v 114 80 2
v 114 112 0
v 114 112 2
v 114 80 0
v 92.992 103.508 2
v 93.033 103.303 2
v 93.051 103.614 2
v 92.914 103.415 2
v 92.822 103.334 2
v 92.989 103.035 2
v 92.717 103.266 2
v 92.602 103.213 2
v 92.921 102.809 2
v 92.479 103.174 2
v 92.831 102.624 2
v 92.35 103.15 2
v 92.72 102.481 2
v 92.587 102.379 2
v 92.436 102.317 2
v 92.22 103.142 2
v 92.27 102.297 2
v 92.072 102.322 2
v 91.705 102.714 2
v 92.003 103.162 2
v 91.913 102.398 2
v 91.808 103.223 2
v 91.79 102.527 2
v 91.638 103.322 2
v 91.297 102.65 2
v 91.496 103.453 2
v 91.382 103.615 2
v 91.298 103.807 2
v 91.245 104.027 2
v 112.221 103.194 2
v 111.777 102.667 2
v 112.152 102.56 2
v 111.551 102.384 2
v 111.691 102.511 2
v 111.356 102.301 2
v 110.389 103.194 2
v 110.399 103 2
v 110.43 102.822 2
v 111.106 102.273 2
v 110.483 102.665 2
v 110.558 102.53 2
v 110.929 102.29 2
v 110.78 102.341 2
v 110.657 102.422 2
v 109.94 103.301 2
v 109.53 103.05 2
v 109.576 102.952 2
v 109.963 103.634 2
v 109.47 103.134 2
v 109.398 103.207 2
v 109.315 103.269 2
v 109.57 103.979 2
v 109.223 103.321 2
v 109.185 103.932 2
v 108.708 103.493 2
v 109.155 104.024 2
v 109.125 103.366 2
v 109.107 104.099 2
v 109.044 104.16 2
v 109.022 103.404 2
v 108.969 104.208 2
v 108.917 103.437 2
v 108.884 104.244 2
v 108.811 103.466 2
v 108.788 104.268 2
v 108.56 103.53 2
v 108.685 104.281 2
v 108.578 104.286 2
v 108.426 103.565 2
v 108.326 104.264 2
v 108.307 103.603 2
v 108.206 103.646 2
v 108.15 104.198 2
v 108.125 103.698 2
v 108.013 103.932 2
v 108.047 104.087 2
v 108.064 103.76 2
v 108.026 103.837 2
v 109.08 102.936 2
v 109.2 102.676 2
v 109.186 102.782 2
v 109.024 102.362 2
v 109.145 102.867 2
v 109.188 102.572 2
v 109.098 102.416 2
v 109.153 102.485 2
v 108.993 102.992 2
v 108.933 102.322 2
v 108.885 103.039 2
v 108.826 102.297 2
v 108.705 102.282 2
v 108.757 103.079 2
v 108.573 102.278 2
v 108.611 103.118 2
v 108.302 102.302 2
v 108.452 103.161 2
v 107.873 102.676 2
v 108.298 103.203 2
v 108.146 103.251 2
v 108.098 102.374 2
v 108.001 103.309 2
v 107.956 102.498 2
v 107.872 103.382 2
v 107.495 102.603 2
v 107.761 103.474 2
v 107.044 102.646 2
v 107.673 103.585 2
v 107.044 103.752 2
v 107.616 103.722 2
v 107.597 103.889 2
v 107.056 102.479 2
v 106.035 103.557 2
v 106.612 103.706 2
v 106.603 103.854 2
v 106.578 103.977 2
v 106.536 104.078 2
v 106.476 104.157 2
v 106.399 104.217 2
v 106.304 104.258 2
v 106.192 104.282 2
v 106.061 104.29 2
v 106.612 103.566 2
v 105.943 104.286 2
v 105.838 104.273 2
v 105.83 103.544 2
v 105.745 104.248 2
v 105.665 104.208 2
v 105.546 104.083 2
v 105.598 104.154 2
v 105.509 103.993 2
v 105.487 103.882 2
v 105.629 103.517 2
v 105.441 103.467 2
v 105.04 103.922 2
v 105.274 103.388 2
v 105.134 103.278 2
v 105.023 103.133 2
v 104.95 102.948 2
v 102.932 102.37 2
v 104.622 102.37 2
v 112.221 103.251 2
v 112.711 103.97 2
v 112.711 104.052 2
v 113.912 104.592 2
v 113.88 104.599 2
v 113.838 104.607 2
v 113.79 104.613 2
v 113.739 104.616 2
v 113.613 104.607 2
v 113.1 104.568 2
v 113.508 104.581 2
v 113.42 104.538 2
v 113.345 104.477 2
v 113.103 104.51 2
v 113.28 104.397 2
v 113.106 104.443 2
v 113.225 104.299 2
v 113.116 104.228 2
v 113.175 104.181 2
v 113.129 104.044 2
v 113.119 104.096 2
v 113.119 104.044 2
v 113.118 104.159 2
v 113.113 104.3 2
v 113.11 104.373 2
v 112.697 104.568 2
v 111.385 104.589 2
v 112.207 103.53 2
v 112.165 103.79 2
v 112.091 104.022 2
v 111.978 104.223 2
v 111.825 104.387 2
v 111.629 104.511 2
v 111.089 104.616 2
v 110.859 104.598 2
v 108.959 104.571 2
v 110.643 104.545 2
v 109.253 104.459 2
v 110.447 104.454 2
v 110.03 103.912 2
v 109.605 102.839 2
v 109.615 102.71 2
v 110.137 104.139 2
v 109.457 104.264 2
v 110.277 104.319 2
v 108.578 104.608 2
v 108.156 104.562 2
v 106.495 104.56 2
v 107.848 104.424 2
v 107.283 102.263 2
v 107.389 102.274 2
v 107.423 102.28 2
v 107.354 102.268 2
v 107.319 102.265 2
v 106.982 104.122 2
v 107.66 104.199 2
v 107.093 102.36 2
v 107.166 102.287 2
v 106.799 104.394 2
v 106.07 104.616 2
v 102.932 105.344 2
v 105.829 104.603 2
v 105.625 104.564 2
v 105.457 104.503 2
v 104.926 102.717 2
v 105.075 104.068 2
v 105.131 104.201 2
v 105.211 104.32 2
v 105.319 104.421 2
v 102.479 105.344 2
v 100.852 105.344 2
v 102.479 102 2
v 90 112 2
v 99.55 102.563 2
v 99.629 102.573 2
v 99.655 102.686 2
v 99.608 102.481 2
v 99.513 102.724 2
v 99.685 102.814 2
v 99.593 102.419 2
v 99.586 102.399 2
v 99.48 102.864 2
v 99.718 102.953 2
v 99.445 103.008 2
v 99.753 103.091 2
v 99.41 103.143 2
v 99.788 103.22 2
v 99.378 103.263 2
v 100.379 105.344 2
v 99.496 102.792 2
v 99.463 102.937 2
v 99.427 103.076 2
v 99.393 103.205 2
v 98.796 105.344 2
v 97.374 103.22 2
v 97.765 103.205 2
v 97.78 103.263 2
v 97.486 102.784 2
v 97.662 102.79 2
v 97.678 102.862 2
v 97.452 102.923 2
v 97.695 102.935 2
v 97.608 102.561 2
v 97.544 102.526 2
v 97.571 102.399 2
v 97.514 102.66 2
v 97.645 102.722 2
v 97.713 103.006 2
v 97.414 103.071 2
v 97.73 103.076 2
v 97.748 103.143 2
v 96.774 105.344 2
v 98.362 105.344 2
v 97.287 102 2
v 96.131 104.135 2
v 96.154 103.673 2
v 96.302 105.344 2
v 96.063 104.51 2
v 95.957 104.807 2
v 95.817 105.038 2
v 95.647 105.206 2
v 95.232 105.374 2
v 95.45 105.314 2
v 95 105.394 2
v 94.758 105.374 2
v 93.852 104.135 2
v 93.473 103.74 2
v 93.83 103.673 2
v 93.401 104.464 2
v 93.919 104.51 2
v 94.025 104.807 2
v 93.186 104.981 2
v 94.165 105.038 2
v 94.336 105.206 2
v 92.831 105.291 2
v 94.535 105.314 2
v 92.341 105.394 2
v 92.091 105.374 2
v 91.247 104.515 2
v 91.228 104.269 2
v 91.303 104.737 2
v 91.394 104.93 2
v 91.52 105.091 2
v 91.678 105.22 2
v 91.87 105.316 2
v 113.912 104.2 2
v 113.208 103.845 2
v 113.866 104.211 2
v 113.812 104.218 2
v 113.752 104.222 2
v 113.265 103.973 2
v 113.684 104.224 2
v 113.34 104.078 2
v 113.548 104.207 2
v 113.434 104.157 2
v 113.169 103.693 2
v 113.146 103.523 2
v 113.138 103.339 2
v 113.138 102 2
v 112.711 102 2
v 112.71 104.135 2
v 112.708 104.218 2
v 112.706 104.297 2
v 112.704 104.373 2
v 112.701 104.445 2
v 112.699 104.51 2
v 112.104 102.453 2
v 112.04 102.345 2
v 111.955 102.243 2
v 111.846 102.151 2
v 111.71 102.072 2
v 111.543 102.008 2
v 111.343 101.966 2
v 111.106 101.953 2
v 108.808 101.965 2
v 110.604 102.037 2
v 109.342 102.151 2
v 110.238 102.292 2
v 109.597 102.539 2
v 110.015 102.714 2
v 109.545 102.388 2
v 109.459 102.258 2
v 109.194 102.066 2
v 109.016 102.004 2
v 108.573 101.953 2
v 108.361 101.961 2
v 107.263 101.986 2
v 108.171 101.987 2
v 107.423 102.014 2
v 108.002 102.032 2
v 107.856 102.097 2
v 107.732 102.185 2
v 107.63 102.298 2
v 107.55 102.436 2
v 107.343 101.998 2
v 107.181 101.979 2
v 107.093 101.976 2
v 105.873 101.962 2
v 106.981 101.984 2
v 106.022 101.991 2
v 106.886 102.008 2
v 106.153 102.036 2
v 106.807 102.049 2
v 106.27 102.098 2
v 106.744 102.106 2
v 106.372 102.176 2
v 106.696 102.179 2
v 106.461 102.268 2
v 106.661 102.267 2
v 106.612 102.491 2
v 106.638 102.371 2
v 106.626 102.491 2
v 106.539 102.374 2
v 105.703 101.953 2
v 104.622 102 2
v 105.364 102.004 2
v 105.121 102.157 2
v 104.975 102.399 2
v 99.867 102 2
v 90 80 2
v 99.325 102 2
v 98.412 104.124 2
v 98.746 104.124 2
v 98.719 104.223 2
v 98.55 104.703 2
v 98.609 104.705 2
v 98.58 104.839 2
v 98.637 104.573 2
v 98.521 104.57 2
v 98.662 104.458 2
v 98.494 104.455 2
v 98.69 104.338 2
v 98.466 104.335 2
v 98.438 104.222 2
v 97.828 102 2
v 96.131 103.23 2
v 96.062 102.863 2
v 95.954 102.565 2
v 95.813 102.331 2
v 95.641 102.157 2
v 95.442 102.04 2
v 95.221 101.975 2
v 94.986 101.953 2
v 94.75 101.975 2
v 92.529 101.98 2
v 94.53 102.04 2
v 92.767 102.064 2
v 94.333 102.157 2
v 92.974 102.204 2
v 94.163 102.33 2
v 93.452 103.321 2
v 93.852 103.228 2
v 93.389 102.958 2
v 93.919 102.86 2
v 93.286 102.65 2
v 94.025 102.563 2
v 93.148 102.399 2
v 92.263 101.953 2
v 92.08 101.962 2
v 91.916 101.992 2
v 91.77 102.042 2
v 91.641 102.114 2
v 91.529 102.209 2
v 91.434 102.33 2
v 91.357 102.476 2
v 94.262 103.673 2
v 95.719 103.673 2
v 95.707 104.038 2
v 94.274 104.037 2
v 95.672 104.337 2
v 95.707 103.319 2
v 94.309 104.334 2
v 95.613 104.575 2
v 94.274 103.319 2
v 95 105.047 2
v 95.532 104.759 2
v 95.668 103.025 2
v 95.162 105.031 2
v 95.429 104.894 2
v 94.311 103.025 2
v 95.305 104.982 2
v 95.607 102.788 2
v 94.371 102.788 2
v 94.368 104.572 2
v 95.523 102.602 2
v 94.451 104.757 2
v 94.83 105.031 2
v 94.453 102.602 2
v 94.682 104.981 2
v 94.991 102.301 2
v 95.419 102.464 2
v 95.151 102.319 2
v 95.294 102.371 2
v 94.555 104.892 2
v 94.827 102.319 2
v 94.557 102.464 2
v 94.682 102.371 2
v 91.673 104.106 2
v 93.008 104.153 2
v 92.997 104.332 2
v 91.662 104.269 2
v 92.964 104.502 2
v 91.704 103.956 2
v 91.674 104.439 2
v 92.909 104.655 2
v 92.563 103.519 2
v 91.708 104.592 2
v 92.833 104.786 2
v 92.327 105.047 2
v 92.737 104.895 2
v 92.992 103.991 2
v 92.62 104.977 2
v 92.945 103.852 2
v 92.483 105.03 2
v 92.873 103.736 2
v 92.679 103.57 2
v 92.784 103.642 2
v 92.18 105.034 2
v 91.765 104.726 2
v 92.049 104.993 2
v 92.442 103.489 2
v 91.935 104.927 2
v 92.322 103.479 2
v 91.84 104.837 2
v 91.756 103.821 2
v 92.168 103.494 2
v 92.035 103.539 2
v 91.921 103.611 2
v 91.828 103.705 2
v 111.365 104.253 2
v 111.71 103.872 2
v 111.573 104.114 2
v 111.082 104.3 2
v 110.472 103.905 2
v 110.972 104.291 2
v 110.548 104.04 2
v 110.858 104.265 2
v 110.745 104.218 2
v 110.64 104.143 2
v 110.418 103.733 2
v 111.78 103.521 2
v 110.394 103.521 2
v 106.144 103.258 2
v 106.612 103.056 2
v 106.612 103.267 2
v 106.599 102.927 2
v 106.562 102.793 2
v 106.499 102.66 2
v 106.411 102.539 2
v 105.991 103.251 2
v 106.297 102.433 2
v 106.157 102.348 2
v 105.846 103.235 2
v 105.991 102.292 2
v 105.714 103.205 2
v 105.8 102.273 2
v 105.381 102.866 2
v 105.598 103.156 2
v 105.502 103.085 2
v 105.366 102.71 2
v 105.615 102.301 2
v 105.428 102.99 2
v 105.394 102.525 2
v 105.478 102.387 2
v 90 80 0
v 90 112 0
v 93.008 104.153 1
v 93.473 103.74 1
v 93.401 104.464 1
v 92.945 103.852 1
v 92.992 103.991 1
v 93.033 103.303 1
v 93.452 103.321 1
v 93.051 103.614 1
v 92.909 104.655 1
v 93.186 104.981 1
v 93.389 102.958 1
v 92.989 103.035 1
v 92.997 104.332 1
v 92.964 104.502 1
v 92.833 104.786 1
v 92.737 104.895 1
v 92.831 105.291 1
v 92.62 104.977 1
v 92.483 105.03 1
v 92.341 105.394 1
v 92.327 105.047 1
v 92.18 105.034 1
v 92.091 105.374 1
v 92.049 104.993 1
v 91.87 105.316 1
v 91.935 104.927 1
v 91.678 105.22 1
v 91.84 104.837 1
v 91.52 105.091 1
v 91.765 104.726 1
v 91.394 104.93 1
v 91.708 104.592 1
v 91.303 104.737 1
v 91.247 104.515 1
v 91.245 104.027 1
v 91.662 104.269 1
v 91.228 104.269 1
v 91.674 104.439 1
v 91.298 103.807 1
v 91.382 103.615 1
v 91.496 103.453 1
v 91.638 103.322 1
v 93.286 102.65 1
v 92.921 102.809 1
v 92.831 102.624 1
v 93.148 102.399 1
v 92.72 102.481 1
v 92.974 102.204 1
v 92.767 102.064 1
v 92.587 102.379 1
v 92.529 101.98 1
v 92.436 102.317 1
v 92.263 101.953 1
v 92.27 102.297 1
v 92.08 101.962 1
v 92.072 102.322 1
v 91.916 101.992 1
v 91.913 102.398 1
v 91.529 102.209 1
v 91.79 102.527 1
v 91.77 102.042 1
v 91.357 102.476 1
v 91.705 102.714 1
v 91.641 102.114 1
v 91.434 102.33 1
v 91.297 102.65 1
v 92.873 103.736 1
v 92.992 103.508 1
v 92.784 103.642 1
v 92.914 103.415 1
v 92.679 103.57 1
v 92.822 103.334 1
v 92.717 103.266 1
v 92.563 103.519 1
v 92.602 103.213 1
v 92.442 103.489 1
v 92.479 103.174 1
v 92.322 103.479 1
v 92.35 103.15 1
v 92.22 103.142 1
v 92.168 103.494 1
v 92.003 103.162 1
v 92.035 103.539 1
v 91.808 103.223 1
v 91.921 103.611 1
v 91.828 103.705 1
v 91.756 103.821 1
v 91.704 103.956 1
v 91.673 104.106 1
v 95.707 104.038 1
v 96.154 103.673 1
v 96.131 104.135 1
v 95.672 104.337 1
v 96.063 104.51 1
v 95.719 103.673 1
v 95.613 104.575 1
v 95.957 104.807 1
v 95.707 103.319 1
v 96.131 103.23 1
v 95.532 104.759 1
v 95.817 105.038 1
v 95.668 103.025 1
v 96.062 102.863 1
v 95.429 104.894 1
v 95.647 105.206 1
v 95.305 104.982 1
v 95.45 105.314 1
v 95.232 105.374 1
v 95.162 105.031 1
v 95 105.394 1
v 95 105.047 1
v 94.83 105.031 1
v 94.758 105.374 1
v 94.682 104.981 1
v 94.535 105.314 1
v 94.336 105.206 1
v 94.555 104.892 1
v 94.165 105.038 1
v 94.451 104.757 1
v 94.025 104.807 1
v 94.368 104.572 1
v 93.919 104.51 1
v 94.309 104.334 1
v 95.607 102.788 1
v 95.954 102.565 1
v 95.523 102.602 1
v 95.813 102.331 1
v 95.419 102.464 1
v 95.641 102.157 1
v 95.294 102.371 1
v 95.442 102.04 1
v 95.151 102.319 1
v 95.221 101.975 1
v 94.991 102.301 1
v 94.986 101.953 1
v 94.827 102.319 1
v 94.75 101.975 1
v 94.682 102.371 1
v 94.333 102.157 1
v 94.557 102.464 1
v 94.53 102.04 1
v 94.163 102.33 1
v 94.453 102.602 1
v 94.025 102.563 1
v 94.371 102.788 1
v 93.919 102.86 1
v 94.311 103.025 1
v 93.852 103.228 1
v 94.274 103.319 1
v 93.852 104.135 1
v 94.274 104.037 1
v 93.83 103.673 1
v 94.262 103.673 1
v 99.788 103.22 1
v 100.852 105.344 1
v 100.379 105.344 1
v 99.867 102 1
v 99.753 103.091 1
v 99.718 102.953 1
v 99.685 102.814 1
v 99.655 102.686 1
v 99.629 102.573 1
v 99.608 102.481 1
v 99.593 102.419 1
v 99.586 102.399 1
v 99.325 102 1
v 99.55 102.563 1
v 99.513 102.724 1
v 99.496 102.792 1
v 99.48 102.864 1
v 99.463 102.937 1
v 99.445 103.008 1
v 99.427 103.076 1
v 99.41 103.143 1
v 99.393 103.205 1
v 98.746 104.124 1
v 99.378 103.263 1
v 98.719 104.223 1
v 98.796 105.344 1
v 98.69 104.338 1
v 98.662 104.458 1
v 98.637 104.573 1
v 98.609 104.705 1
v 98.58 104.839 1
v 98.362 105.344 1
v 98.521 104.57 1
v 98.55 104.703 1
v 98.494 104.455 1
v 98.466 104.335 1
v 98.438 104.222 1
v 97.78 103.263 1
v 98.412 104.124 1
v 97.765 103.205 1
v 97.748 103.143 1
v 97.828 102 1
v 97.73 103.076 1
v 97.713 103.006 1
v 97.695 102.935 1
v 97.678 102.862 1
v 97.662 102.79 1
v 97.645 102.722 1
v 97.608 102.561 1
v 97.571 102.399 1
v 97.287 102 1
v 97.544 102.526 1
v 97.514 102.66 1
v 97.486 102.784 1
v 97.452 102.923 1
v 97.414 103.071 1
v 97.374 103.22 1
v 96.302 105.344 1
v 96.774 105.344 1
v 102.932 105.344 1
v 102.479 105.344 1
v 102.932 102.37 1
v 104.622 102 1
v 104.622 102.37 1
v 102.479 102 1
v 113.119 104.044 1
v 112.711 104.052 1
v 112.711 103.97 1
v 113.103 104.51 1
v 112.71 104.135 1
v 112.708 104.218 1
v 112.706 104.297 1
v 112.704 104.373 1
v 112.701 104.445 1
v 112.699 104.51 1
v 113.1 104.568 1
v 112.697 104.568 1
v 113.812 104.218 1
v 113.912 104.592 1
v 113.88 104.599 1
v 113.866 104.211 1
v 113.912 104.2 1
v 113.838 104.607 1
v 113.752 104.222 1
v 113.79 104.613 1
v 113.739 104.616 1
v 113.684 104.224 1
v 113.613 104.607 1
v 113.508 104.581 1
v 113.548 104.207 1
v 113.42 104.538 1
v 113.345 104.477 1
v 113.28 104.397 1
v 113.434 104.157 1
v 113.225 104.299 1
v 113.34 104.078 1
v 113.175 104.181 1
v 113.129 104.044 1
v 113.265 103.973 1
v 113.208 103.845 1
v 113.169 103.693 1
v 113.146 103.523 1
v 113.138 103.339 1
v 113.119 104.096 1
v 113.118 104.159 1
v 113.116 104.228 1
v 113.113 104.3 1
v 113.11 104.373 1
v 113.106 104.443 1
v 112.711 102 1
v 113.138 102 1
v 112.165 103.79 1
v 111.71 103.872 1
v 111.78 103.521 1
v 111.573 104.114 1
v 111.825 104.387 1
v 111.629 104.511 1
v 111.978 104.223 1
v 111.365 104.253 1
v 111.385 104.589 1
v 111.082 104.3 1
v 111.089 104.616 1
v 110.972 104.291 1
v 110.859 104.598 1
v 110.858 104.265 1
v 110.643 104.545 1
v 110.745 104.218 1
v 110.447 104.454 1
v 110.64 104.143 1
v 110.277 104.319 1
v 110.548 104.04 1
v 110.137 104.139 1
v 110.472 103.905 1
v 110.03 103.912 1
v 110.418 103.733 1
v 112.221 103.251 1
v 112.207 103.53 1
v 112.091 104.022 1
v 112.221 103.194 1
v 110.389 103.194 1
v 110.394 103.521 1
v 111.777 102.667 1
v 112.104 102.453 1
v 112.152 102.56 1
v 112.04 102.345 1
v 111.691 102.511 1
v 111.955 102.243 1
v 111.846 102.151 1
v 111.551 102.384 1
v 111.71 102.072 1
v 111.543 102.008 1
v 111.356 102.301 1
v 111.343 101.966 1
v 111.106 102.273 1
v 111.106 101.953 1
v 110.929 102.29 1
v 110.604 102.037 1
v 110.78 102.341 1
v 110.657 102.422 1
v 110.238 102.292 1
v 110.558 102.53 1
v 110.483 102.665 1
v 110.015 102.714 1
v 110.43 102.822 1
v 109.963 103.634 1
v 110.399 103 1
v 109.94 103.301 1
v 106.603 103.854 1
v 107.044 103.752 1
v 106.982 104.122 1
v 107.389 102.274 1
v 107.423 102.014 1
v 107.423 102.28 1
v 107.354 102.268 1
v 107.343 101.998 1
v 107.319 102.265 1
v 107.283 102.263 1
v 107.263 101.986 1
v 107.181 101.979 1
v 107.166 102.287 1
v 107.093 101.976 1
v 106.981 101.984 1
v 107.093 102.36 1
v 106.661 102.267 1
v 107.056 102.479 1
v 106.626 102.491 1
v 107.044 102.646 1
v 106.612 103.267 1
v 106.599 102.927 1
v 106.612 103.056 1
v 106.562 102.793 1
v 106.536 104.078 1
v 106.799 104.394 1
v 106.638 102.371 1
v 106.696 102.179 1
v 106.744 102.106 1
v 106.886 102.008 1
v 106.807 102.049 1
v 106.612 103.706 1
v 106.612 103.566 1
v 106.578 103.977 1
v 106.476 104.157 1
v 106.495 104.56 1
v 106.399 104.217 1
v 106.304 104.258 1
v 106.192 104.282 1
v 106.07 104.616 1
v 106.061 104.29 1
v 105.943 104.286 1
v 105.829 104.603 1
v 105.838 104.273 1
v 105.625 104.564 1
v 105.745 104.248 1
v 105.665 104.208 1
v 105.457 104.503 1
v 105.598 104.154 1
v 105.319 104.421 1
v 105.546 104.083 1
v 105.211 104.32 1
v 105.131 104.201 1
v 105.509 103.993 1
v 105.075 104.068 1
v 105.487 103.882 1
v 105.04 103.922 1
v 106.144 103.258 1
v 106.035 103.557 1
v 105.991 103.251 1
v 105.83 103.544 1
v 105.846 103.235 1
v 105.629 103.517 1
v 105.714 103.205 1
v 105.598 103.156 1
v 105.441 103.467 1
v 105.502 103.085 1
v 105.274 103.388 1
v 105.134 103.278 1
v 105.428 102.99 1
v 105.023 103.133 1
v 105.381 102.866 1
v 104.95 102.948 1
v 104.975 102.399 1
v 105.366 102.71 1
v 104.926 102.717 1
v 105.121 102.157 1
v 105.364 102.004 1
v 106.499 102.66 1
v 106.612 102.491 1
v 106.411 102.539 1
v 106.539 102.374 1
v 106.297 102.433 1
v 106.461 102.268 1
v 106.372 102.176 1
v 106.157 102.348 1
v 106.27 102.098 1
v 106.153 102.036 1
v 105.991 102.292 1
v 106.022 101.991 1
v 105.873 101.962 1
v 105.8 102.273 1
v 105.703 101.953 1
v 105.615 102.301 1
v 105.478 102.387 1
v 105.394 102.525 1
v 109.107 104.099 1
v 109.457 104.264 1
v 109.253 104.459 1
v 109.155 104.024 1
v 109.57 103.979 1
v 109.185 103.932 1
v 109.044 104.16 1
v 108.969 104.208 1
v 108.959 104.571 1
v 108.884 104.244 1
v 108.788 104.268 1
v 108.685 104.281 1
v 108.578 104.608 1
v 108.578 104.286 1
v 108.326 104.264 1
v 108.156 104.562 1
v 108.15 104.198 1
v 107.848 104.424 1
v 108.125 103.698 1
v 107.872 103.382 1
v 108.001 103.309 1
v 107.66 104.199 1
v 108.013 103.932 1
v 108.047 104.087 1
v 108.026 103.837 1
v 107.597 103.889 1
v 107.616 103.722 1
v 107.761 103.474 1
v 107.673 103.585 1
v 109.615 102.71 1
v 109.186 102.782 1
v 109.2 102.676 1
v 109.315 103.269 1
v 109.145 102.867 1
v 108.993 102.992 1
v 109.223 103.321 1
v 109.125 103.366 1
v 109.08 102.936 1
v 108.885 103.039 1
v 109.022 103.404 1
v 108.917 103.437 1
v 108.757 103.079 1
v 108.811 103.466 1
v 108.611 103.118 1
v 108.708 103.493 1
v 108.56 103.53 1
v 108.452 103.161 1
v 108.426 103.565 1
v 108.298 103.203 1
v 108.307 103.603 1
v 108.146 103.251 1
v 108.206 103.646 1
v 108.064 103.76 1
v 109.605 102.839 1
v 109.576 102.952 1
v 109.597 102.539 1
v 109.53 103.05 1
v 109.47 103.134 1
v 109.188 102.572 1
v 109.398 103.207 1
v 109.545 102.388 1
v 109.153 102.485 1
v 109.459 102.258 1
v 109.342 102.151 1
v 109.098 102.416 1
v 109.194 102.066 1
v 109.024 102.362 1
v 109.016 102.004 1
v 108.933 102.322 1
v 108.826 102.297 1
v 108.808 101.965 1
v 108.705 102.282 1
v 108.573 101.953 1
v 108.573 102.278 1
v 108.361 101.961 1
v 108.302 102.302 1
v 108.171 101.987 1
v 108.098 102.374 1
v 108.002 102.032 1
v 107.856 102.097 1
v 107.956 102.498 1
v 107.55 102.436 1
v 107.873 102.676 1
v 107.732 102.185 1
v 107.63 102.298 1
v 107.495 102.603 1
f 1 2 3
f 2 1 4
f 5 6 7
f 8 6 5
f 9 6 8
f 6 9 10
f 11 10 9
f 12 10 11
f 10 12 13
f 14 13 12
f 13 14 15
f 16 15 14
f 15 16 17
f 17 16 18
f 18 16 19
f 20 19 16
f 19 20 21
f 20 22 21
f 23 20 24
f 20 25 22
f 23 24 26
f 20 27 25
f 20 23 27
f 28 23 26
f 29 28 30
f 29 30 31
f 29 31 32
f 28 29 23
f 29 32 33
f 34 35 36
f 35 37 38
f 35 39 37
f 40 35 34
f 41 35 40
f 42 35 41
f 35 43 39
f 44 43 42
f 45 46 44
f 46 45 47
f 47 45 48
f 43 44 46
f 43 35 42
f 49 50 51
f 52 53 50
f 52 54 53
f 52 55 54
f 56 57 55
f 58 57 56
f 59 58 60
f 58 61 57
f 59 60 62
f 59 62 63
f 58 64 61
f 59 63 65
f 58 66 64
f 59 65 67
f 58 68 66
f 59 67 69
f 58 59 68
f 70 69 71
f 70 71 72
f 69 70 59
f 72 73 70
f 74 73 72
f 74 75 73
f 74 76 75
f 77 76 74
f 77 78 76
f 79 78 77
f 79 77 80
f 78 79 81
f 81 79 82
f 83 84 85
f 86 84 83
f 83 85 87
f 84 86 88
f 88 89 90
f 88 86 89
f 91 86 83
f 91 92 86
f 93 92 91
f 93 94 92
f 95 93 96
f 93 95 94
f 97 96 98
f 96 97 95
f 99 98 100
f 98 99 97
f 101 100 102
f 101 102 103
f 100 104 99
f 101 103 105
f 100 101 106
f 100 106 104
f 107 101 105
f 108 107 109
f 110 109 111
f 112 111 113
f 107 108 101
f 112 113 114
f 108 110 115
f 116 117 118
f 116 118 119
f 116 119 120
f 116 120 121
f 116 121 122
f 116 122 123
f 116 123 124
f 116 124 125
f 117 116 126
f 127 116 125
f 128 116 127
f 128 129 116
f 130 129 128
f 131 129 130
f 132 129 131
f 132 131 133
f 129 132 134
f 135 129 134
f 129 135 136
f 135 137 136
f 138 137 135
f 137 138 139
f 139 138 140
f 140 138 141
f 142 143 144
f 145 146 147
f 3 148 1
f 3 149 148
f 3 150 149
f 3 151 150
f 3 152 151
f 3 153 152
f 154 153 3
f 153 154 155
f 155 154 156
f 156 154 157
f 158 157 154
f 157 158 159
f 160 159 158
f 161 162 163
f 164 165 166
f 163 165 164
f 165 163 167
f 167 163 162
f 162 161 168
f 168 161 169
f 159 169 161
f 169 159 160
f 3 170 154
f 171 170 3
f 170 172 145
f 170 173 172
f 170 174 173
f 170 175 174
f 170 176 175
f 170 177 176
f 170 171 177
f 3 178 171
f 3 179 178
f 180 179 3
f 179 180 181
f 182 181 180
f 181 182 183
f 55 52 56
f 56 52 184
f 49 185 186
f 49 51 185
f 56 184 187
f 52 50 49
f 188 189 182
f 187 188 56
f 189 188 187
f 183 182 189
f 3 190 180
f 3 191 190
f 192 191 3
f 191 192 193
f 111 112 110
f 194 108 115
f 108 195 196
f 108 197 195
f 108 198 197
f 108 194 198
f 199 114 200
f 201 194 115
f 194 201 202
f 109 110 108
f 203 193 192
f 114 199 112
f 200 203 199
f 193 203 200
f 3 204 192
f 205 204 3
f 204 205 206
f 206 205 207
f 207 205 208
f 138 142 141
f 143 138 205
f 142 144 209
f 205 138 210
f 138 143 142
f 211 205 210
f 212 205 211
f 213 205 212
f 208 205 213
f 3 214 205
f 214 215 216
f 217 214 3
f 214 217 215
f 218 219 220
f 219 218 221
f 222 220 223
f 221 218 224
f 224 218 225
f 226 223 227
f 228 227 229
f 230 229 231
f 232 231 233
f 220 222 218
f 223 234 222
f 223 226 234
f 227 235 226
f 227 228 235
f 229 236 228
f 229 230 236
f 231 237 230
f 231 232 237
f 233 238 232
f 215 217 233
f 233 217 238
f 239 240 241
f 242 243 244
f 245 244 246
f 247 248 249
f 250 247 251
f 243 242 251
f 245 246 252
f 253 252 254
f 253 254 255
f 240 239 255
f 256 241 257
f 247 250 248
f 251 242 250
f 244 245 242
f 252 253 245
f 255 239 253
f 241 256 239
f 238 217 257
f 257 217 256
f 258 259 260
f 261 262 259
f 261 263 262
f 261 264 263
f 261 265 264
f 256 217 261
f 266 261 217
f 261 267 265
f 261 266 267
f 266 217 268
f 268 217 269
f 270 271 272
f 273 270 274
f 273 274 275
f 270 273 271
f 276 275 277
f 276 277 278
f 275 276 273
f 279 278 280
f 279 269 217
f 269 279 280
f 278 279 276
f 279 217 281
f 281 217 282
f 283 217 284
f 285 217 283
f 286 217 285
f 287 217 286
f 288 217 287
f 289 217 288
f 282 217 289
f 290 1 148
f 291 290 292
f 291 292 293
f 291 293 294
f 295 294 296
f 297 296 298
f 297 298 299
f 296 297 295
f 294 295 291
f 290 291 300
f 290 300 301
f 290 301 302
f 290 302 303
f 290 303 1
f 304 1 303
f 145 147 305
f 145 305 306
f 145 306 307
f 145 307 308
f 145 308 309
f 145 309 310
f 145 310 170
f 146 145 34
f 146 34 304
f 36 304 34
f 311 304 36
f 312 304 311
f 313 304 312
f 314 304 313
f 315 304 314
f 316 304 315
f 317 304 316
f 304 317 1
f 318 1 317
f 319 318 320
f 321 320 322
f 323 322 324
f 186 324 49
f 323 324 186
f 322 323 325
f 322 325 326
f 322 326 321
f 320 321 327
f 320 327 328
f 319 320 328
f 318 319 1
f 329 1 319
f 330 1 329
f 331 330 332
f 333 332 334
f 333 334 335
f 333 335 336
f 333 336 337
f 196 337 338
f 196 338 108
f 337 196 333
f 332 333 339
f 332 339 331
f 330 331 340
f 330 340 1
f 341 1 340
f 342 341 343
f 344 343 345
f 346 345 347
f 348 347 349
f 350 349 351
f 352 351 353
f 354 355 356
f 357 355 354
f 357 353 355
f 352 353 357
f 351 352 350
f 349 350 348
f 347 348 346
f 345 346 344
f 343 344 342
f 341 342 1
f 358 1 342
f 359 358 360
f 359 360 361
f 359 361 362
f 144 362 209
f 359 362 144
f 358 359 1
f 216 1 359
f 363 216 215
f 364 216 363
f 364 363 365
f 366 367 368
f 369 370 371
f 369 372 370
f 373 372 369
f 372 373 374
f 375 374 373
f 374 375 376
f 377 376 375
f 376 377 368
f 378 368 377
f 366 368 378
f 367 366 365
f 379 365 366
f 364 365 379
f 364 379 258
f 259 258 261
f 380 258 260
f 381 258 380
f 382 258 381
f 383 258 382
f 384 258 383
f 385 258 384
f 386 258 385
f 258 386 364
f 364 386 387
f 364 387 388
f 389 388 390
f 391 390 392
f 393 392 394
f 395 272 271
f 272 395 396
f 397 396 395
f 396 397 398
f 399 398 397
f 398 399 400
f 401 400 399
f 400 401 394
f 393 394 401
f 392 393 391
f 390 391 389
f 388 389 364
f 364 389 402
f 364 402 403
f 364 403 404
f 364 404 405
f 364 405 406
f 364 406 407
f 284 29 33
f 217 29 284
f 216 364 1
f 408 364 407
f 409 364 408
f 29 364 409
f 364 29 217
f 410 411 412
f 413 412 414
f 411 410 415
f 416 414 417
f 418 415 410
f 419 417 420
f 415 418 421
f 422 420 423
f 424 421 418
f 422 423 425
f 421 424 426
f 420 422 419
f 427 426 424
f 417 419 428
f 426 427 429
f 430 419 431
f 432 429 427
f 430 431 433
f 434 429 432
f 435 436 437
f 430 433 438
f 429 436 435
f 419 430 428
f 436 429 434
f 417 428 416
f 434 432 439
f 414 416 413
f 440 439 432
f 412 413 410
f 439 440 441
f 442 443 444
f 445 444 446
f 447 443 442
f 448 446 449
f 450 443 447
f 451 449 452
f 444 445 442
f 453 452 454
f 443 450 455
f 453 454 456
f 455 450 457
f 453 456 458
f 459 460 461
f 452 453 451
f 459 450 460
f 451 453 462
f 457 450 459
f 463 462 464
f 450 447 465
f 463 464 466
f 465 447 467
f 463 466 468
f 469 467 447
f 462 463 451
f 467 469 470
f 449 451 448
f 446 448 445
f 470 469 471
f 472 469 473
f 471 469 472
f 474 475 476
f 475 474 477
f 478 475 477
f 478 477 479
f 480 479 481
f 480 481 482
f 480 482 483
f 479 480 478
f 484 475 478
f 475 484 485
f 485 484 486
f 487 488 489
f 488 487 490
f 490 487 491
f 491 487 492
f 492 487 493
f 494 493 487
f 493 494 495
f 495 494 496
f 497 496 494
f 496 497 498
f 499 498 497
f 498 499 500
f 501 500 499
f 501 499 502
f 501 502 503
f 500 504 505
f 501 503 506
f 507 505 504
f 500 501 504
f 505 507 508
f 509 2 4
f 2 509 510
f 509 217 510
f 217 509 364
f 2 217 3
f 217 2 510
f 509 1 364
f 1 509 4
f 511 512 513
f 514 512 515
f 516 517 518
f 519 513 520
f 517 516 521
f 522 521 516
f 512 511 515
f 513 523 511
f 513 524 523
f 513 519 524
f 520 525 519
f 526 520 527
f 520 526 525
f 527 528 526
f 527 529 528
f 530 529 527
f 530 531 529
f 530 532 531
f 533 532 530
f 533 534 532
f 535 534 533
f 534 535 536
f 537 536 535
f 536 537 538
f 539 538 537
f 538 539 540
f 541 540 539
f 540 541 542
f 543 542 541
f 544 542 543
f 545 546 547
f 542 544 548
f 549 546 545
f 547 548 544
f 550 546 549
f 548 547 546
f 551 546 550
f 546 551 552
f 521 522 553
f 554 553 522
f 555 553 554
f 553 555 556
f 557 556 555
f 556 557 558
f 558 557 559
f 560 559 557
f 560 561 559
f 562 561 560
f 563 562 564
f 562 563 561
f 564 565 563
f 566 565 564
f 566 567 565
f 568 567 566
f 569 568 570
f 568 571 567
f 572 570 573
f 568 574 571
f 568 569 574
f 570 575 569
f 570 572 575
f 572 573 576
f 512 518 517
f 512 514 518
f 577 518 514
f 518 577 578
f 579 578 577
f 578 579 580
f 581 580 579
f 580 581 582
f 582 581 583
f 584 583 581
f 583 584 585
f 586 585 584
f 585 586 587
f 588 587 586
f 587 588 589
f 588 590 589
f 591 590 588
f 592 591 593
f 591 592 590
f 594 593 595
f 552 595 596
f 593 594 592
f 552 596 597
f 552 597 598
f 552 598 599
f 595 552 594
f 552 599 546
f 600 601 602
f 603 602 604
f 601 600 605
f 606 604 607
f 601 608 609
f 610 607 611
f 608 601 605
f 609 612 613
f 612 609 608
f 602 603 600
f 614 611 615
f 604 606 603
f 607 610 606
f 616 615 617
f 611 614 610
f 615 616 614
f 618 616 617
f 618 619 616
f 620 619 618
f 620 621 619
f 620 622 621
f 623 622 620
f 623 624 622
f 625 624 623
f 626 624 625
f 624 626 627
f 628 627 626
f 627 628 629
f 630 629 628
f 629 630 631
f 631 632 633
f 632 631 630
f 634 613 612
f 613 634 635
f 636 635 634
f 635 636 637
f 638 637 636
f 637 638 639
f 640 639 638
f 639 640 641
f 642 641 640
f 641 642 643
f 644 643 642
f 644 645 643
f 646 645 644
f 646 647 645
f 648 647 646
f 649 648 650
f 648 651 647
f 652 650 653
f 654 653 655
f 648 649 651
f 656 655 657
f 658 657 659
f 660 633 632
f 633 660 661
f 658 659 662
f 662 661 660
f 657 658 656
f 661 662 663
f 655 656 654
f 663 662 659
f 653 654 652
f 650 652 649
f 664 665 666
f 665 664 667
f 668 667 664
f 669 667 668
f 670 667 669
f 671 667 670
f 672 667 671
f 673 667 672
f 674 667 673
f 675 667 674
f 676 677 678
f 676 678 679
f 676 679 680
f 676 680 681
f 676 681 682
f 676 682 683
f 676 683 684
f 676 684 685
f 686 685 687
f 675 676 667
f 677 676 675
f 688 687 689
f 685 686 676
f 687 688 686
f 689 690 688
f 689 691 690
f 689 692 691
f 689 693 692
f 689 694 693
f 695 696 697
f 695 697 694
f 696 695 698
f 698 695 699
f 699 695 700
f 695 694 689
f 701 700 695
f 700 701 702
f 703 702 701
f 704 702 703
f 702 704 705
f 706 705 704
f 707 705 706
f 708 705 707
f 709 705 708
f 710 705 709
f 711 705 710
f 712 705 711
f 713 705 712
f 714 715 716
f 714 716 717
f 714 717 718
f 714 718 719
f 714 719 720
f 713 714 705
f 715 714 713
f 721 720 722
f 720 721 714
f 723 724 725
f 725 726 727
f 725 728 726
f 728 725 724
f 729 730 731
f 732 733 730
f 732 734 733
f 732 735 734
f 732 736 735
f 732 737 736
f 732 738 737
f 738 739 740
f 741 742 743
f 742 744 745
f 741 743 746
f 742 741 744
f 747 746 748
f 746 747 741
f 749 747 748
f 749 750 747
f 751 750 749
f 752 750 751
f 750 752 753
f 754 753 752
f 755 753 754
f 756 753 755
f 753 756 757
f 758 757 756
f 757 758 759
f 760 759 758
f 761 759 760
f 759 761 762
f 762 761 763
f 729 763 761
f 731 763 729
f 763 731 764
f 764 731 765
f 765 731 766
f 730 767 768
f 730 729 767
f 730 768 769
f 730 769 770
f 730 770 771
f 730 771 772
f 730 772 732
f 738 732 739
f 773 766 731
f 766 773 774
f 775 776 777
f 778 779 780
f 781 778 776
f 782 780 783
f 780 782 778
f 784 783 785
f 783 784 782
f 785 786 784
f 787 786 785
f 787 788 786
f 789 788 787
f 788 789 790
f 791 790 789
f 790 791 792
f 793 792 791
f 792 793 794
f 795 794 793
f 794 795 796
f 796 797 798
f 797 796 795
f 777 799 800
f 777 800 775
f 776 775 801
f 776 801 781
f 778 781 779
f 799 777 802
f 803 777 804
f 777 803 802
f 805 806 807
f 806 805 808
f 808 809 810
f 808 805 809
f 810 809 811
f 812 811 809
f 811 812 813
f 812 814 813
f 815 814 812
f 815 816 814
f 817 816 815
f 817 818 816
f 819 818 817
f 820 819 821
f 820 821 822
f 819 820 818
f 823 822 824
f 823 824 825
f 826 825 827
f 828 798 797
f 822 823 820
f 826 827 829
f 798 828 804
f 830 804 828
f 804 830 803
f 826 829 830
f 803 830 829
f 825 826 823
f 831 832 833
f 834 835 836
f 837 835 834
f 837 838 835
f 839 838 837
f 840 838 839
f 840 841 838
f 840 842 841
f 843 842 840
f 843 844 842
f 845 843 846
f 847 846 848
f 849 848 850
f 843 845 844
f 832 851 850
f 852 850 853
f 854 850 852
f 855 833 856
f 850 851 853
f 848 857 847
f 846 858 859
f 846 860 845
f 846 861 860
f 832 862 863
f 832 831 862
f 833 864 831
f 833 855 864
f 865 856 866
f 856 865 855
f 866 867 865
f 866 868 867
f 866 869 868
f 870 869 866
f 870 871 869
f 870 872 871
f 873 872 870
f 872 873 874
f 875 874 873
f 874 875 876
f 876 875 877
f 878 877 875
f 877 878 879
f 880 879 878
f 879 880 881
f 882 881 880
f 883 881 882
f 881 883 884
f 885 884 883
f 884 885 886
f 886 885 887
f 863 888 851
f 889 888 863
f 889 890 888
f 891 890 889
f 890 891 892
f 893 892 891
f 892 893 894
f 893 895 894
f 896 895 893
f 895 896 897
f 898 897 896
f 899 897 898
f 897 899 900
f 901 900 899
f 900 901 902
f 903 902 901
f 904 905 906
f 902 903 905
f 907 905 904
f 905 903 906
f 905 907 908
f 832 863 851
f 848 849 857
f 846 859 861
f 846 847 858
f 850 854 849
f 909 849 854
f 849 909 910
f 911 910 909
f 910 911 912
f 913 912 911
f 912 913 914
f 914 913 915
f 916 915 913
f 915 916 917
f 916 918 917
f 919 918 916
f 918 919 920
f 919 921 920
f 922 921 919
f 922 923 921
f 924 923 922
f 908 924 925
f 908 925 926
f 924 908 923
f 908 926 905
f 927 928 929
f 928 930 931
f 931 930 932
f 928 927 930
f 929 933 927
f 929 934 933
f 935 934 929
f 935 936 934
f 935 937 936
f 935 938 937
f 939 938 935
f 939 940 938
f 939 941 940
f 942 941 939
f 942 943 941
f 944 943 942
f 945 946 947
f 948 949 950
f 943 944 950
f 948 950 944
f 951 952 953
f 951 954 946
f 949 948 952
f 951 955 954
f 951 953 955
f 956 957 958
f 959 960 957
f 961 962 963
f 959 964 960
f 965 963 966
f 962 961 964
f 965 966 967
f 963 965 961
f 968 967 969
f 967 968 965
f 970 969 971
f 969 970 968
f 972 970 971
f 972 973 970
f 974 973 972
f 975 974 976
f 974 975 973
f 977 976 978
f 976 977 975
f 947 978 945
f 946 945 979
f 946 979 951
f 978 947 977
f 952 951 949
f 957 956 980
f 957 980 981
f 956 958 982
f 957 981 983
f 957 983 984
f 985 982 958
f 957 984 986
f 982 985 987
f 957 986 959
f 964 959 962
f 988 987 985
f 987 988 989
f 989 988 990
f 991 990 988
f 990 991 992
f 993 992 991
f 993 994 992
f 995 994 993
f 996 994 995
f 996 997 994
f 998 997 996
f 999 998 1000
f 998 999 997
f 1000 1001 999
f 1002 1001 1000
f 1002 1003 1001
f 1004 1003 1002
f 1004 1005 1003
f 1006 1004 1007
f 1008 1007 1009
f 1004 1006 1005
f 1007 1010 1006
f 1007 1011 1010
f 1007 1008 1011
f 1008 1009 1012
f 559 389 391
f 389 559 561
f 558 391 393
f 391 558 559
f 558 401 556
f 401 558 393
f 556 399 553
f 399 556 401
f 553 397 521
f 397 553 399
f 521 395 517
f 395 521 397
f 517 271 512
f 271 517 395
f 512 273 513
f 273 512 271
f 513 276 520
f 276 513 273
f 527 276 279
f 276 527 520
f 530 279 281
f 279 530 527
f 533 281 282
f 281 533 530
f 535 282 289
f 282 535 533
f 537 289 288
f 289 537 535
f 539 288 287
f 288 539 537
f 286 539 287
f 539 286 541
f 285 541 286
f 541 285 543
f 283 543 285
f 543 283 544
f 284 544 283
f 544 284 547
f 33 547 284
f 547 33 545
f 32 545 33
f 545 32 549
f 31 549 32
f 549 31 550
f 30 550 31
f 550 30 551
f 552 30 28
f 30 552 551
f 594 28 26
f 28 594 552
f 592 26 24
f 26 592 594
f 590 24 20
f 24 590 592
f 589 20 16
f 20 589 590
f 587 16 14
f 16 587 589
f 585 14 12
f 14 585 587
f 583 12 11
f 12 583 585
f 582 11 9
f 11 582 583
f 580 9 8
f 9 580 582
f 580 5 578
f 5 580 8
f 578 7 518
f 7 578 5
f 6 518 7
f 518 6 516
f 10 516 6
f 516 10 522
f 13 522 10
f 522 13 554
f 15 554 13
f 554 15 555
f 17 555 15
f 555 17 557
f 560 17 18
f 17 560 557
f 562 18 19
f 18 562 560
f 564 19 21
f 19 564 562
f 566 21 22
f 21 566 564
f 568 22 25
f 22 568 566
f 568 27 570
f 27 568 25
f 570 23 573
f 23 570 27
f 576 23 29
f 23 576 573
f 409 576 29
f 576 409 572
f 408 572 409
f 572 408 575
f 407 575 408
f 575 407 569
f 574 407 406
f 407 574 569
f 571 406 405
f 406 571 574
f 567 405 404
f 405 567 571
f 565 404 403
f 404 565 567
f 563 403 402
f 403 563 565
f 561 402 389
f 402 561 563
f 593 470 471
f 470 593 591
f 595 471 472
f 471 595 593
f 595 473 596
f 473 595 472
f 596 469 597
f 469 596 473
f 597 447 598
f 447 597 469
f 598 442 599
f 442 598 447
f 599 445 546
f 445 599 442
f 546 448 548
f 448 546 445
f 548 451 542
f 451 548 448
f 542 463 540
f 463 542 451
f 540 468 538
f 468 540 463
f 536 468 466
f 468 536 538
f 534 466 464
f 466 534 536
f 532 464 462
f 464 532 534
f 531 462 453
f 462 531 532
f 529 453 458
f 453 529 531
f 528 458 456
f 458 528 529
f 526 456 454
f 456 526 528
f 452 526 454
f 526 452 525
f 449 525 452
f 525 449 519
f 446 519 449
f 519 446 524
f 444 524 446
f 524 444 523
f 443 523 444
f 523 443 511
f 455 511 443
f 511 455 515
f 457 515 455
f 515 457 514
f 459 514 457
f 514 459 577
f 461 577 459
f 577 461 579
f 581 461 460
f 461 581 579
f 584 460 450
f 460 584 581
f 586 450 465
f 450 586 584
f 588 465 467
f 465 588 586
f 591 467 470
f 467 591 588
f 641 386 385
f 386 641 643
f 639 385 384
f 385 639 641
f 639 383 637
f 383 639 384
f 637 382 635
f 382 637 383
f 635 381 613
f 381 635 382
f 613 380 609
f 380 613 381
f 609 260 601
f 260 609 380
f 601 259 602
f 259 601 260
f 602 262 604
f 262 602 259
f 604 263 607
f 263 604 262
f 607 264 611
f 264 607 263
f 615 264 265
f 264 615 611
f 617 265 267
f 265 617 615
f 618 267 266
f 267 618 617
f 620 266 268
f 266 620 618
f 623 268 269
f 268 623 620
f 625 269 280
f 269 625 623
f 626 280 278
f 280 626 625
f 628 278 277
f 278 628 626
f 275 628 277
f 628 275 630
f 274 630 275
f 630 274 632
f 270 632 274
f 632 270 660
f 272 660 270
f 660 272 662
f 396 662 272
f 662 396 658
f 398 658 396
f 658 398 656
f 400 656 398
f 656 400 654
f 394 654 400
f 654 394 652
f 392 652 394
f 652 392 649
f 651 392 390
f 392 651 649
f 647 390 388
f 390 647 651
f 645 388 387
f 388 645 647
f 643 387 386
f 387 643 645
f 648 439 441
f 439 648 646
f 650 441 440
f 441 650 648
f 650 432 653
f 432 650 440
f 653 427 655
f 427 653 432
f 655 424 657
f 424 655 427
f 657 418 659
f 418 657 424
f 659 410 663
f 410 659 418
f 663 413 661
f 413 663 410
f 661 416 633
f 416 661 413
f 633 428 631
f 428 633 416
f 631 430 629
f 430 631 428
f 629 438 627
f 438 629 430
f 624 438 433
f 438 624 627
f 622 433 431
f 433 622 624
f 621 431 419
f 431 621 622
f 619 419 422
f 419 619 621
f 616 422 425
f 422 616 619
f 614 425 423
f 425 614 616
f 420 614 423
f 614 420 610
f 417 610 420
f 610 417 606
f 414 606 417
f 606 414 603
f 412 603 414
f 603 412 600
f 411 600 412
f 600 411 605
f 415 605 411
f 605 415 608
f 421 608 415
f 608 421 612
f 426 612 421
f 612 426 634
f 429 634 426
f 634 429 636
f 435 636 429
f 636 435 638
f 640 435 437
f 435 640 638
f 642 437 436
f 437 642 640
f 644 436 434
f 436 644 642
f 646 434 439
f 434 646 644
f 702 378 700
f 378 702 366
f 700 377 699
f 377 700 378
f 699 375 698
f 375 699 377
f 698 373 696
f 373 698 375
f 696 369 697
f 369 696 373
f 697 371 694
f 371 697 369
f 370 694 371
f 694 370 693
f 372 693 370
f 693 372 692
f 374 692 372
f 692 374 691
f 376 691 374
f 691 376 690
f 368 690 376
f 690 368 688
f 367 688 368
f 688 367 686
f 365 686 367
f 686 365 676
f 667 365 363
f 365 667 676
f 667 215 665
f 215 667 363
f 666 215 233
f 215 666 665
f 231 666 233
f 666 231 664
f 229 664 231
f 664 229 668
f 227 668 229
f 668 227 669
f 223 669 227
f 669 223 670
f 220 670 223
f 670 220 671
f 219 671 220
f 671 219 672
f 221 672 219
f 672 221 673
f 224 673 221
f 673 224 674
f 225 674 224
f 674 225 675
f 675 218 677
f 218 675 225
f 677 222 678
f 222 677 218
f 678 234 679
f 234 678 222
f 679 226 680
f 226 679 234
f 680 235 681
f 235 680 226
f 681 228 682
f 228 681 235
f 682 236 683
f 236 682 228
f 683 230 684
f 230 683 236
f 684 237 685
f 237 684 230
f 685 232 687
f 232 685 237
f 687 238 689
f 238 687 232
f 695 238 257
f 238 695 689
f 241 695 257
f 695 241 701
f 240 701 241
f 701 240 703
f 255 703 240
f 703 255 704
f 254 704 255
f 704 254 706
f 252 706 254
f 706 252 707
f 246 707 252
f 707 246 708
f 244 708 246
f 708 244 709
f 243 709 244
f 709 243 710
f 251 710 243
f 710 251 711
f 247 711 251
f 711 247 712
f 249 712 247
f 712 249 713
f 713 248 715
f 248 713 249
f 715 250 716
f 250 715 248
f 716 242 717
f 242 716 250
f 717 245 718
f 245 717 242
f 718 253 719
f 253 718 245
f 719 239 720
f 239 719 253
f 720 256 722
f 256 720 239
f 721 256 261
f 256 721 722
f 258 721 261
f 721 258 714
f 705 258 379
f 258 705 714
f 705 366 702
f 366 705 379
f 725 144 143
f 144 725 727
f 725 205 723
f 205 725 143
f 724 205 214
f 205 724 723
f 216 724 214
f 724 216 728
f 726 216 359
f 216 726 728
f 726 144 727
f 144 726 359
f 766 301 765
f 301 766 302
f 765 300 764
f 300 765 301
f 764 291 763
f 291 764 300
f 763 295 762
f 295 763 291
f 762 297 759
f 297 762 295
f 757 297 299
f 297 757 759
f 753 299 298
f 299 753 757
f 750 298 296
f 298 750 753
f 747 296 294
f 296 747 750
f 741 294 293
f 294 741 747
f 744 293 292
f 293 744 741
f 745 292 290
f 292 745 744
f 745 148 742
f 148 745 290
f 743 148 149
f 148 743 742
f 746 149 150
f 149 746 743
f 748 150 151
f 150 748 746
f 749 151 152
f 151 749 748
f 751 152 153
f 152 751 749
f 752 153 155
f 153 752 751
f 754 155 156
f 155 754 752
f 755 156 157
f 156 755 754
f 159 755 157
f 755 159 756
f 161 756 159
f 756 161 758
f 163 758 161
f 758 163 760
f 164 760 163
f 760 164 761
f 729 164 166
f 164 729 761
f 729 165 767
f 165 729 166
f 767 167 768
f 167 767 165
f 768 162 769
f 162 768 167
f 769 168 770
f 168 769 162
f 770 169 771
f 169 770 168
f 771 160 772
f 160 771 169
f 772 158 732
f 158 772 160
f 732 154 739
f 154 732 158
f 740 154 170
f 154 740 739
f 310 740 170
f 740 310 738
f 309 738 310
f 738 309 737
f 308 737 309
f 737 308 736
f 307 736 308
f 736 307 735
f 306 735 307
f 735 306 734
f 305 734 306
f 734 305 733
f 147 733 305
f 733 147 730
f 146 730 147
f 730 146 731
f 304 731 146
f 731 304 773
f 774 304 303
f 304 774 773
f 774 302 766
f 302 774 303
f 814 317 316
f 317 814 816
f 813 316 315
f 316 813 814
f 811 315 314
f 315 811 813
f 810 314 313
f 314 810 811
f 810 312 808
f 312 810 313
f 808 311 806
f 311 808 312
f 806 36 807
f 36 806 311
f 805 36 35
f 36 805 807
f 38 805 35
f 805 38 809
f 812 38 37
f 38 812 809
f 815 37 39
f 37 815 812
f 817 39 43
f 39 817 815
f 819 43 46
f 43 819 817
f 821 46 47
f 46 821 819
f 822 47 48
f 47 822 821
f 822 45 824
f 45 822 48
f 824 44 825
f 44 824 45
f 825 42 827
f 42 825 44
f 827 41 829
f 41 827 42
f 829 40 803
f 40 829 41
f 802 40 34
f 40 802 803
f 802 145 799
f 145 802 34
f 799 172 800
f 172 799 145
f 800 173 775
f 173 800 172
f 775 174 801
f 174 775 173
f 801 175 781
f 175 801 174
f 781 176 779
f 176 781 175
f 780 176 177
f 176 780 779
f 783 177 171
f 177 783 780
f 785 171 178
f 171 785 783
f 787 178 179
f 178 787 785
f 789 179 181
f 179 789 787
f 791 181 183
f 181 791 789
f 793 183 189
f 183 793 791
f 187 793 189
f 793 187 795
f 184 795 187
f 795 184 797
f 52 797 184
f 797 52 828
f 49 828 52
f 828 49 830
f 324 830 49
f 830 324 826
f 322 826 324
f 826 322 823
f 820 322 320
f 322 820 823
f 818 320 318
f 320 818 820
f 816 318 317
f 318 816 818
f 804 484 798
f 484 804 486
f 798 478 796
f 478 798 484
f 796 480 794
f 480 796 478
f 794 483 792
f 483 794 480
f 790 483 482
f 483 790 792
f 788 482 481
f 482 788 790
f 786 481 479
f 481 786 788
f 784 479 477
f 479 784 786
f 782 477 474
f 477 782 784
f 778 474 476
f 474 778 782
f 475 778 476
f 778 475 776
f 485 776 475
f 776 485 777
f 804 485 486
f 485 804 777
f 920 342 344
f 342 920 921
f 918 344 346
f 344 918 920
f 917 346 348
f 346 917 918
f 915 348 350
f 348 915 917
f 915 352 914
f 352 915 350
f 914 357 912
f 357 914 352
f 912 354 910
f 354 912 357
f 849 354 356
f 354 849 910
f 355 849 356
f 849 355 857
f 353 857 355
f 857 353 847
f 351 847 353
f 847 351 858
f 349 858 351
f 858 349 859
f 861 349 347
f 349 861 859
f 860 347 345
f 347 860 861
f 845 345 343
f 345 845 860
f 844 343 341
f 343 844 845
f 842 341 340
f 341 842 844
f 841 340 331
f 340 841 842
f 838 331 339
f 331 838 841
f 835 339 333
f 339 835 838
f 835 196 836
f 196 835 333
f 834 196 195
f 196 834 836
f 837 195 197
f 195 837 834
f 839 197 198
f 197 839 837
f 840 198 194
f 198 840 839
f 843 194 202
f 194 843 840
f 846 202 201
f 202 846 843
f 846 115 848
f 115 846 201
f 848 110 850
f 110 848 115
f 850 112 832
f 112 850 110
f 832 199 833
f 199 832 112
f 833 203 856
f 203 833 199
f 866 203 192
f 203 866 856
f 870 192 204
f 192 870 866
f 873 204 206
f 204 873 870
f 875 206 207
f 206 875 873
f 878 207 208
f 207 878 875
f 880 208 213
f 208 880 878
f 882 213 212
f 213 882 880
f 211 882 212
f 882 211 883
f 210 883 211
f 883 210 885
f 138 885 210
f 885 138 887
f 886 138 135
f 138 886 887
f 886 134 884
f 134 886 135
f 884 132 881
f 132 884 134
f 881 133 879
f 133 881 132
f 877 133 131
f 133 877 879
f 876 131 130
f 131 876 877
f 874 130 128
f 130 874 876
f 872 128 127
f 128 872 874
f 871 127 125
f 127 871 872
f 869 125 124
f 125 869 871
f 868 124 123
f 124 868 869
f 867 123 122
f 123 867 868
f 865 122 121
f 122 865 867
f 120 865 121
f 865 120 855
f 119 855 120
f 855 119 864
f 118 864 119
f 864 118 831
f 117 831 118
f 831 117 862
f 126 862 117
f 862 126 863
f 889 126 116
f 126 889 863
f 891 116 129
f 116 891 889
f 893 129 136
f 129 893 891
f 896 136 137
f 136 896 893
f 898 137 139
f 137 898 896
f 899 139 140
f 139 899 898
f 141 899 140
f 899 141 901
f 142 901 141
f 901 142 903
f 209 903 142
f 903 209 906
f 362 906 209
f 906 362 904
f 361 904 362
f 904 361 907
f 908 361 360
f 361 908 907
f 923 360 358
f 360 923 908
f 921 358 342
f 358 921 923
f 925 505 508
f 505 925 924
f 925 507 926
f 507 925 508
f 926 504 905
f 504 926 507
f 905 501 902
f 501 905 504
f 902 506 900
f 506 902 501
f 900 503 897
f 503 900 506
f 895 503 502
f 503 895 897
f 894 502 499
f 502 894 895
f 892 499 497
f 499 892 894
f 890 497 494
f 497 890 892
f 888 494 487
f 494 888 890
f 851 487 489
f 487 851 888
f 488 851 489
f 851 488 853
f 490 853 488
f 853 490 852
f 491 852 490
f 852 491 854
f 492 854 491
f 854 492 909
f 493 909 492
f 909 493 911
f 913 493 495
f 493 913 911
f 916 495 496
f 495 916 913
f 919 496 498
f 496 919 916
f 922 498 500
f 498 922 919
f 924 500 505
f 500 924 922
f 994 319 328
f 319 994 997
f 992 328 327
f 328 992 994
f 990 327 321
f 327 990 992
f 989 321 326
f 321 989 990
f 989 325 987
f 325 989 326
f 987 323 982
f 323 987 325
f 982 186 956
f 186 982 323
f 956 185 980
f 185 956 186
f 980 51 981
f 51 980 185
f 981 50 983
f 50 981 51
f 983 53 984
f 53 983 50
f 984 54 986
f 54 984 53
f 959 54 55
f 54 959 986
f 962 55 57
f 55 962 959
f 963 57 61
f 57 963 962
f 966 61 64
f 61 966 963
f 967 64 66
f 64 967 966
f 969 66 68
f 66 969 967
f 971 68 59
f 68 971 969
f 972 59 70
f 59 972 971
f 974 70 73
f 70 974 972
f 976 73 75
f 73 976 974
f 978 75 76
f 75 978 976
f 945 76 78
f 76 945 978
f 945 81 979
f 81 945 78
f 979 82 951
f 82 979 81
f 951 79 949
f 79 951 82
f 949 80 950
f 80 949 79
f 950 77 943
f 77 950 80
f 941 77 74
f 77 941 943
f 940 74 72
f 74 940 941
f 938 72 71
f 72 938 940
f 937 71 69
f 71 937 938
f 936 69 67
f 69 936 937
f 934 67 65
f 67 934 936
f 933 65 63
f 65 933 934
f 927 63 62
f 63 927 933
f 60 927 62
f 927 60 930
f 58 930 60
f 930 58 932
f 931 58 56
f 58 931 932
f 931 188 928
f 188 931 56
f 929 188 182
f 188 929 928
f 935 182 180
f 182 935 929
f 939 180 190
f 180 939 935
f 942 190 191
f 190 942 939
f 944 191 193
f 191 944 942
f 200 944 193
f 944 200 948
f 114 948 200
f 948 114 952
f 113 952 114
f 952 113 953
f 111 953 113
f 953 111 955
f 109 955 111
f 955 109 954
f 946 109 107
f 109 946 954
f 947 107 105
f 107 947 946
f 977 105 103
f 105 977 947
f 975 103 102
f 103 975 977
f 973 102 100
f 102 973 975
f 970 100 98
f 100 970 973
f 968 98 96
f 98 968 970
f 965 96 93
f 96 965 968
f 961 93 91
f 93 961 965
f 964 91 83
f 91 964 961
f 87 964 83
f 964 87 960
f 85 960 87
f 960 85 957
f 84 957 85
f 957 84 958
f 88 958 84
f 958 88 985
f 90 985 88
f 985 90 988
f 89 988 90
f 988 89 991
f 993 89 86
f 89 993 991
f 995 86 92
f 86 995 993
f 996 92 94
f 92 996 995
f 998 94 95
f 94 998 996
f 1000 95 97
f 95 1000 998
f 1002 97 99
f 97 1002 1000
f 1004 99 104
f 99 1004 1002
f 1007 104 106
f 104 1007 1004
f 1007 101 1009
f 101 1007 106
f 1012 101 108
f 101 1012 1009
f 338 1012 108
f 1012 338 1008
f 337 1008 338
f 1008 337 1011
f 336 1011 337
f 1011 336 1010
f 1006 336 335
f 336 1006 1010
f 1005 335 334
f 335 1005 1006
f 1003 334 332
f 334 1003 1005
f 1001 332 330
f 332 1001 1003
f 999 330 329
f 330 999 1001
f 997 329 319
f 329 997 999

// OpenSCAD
module sdBlank(text="") {
	sdWidth = 24;
	sdLength = 32;
	sdDepth = 2;

	difference() {
		cube([sdWidth, sdLength, sdDepth]);

		translate([1,sdLength - 10,sdDepth - 1]) {
			linear_extrude(height=1) {
				text(text, size=3.5);
			}
		}
	}
}

module employeeBlank(text="") {
	sdWidth = 24;
	sdLength = 32;
	sdDepth = 2;

	difference() {
		cube([sdWidth, sdLength, sdDepth]);

		translate([1,sdLength - 10,sdDepth - 1.5]) {
			linear_extrude(height=1.5) {
				text(text, size=3.5);
			}
		}
	}
}

union(){
for(i = [1:4]) {
	translate([((i-1) * 30), 0, 0]) {
		sdBlank(str("Laptop ",i));
	}
}

for(i = [5:8]) {
	translate([((i-5) * 30), 40, 0]) {
		sdBlank(str("Laptop ",i));
	}
}
}

for(i = [1:3]) {
	translate([((i-1) * 30), 80, 0]) {
		sdBlank(str("Caliper ",i));
	}
}

!translate([3*30, 80, 0]) {
	sdBlank(str("90W Laser"));
}
